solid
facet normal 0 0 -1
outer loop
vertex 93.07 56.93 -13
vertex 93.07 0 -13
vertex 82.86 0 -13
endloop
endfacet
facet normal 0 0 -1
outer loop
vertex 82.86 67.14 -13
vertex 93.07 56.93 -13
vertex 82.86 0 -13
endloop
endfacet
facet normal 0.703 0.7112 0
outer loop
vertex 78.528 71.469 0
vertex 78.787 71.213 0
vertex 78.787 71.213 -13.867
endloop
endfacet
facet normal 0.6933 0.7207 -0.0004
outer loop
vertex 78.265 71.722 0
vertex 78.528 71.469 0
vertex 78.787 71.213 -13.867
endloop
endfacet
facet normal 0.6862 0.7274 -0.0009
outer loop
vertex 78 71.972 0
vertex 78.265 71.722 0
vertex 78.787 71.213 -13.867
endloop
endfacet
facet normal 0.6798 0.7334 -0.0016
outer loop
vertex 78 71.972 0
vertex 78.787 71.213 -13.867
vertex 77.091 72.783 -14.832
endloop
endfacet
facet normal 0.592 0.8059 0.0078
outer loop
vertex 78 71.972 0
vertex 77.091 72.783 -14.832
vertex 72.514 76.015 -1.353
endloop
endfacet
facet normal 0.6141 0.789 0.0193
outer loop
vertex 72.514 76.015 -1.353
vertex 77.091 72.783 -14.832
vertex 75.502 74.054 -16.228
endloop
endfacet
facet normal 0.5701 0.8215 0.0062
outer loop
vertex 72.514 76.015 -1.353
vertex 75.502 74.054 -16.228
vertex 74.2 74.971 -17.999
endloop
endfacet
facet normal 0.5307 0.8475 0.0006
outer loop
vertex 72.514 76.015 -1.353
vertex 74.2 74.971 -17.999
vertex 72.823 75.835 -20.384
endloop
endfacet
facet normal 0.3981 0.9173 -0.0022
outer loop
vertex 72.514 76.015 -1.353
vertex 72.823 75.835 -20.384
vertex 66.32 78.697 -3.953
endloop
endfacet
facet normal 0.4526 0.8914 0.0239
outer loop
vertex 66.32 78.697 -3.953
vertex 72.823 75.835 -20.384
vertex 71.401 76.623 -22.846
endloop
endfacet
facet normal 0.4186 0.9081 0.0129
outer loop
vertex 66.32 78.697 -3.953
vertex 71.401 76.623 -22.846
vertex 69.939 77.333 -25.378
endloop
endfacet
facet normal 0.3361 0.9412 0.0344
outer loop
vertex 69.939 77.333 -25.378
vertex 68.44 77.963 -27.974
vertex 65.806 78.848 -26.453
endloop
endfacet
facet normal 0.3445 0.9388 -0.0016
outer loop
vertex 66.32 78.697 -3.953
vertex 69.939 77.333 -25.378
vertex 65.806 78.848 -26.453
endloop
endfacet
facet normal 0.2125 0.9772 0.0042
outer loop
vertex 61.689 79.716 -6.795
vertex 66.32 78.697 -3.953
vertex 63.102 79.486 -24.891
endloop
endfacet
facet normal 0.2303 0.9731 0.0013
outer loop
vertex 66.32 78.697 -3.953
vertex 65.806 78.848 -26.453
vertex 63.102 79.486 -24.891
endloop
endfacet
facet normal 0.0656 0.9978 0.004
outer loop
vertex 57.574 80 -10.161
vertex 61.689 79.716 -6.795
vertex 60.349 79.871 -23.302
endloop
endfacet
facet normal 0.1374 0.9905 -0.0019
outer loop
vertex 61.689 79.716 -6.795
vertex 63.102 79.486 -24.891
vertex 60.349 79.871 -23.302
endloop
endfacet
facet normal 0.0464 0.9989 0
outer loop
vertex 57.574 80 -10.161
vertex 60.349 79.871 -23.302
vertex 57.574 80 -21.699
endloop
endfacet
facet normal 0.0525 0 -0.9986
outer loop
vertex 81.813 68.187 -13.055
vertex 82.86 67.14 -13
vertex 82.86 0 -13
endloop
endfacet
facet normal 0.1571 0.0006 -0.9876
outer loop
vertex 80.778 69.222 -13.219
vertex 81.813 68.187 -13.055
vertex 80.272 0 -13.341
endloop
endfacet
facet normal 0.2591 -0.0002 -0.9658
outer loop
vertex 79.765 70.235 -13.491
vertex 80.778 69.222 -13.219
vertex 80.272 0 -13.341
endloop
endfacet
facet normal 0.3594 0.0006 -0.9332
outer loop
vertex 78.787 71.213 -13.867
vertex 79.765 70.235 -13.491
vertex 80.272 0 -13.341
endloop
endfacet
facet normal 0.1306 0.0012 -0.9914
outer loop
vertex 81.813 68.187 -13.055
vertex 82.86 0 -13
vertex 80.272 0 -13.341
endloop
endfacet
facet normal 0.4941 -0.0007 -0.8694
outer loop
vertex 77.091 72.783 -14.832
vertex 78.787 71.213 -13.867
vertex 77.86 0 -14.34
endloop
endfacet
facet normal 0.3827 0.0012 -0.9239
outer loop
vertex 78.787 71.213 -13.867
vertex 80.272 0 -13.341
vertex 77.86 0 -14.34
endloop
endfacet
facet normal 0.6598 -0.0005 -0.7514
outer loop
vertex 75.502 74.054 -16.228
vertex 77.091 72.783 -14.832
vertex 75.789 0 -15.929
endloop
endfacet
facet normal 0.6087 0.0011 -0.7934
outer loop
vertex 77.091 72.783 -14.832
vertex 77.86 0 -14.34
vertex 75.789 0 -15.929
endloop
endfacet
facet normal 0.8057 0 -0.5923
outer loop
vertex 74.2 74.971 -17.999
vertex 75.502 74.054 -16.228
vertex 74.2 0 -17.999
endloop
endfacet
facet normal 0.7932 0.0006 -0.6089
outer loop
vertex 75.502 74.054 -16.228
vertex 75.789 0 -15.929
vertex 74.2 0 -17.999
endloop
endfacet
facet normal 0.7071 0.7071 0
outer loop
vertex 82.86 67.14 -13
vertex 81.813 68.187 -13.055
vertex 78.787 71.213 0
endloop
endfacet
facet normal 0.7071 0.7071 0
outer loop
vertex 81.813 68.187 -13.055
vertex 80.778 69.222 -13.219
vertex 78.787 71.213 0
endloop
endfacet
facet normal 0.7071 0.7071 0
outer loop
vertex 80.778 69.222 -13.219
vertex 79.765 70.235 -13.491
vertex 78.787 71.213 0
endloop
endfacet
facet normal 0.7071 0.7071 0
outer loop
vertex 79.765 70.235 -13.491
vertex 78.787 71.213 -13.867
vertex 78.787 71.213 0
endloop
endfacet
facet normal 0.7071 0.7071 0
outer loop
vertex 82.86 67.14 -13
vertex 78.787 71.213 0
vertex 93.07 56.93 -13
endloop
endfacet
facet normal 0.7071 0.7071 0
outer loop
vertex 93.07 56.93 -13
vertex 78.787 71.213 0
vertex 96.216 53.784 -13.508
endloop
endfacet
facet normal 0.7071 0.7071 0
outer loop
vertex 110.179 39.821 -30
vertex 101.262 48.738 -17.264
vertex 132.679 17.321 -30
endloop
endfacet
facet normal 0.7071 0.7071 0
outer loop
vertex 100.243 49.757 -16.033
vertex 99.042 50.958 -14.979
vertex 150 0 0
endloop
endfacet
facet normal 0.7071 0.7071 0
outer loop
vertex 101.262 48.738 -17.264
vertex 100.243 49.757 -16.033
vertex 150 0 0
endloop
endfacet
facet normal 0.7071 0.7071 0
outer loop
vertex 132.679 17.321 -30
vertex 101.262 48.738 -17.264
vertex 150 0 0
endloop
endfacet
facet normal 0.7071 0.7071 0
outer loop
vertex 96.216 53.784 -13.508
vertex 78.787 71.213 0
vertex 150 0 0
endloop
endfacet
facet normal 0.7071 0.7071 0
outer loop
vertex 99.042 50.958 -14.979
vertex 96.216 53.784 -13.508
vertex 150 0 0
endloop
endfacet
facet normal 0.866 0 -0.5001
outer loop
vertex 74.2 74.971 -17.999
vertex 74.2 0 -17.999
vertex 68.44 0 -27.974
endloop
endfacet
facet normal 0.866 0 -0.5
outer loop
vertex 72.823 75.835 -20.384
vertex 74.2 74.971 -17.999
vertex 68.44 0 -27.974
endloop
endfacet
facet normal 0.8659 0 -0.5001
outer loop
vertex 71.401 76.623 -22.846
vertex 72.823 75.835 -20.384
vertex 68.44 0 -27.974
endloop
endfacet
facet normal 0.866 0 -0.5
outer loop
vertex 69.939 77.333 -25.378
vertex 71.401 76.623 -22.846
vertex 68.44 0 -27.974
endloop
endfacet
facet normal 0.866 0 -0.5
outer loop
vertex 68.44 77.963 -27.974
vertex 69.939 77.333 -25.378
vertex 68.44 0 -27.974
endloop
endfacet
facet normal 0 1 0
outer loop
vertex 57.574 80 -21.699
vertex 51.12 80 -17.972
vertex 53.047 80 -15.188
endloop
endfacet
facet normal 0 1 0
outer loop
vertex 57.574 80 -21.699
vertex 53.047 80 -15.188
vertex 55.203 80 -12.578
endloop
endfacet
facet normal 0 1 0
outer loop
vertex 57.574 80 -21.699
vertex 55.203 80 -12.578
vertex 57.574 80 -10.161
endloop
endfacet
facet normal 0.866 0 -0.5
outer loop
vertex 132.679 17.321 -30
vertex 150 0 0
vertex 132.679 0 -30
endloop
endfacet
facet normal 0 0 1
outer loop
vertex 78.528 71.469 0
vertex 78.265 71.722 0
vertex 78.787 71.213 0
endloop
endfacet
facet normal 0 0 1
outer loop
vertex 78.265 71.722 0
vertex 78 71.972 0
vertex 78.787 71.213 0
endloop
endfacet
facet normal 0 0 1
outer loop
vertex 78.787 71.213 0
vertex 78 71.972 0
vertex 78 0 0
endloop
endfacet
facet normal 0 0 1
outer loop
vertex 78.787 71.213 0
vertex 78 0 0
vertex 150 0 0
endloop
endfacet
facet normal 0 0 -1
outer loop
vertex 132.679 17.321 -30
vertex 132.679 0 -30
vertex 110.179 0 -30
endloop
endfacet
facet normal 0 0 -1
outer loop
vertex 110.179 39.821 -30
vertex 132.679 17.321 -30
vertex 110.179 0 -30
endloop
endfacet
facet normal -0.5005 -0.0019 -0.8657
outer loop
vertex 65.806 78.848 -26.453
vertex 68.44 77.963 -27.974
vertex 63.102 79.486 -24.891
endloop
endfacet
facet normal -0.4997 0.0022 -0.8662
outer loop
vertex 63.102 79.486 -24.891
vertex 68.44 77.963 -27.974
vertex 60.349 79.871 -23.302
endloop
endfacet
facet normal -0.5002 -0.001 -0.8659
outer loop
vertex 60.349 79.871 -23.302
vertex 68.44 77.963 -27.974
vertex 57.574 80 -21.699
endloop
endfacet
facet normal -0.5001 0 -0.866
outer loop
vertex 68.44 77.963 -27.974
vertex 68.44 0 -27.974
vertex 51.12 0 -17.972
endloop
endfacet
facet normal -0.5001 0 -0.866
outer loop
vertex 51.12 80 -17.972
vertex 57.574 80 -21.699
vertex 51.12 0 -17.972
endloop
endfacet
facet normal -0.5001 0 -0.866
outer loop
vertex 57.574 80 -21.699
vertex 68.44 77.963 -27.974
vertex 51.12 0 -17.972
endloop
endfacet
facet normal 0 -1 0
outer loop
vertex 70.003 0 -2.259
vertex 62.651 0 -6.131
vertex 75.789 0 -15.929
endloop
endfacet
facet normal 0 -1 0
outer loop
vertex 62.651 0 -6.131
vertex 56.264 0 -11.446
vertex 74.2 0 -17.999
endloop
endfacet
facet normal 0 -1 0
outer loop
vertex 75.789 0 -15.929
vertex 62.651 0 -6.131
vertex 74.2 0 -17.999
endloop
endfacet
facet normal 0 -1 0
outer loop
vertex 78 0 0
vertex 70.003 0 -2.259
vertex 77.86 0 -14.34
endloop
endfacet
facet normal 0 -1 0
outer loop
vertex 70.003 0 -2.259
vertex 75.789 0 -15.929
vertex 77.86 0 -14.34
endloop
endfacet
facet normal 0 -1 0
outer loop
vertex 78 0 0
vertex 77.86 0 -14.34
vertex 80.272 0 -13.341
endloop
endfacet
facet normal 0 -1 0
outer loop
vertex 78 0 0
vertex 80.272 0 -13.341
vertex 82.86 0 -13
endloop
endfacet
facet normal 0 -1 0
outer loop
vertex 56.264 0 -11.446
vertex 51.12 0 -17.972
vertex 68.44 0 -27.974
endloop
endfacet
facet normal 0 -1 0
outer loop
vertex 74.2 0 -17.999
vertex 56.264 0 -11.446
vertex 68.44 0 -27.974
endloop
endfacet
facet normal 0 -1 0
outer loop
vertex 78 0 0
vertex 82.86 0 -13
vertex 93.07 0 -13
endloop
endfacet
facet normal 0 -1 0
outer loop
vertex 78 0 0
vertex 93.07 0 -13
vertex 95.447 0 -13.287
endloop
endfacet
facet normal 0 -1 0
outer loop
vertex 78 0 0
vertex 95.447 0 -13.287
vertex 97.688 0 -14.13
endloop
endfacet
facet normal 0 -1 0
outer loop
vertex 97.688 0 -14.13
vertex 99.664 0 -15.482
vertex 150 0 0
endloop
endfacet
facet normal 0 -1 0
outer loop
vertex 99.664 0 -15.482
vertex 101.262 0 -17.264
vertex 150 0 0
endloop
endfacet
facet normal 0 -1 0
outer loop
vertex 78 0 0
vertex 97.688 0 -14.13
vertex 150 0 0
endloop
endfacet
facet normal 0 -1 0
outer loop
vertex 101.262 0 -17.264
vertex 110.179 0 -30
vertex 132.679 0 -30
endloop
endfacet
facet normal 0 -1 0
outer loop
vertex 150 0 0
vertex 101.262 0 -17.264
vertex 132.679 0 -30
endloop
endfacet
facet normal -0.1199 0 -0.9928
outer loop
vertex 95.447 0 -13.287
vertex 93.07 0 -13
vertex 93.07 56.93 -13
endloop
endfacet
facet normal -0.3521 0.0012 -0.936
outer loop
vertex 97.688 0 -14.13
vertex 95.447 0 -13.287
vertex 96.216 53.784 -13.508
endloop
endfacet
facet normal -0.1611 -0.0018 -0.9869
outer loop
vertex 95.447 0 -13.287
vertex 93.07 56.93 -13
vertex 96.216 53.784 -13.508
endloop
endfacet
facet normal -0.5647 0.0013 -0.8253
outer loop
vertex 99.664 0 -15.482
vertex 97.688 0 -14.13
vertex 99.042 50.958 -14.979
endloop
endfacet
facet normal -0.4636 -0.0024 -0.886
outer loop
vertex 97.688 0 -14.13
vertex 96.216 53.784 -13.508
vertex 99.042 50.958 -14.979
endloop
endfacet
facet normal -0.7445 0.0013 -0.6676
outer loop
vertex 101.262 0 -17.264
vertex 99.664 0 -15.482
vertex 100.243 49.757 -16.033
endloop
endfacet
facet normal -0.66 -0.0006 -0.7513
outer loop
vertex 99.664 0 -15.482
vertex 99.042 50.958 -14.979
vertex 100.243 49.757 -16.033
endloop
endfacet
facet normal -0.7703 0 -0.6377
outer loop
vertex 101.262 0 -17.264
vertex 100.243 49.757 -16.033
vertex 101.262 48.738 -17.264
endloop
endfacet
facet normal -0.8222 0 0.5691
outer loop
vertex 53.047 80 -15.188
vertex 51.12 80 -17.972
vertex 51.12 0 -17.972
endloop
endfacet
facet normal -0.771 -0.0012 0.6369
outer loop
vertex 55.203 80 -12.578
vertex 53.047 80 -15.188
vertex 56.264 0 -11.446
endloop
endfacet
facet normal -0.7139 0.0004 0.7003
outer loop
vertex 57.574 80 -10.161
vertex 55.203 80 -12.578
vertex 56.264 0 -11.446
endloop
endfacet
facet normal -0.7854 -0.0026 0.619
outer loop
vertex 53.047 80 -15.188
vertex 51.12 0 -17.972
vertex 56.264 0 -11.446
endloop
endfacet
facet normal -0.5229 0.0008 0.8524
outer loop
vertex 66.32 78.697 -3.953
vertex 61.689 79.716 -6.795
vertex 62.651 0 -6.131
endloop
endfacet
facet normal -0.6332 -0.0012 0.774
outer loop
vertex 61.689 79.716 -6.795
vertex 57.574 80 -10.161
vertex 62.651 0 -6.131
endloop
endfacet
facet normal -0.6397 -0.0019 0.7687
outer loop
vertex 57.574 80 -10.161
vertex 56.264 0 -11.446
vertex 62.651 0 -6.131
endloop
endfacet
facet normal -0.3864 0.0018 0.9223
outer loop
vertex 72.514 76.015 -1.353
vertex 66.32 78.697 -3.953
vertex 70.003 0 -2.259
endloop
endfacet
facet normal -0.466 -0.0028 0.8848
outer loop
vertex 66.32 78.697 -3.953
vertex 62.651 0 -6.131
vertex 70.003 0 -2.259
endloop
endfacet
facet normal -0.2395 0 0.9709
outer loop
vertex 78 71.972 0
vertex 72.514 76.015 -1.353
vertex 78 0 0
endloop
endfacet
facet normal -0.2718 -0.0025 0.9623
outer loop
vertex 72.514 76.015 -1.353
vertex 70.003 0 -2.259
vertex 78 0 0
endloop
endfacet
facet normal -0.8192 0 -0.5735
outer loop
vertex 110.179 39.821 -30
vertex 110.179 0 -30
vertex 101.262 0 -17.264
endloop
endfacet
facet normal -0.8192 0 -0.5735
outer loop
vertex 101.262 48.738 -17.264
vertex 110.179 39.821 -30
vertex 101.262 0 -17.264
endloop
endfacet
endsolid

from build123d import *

# Parameters (mm, degrees)
BOSS_EXTRUDE1_DEPTH = 80
CUT_EXTRUDE1_DEPTH  = 60
FILLET1_R           = 30
FILLET3_R           = 10


with BuildPart() as part:
    # Sketch31 → Boss-Extrude1 (new body)
    with BuildSketch(Plane(origin=(0, 0, 0), x_dir=(1, 0, 0), z_dir=(0, 1, 0))):
        with BuildLine():
            Line((78, 0), (150, 0))
            Line((150, 0), (132.679491924, 30))
            Line((132.679491924, 30), (110.179491924, 30))
            Line((110.179491924, 30), (98.275963775, 13))
            Line((98.275963775, 13), (82.859757015, 13))
            ThreePointArc((82.859757015, 13), (77.860100275, 14.33954779), (74.199899362, 17.999313504))
            Line((74.199899362, 17.999313504), (68.440162758, 27.973643859))
            Line((68.440162758, 27.973643859), (51.120447452, 17.972270867))
            ThreePointArc((51.120447452, 17.972270867), (62.6510159, 6.130700387), (78, 0))
        make_face()
    extrude(amount=BOSS_EXTRUDE1_DEPTH)

    # Sketch32 → Cut-Extrude1 (cut)
    with BuildSketch(Plane.XY):
        Polygon((70, 80), (150, 0), (150, 80), align=None)
    extrude(amount=-CUT_EXTRUDE1_DEPTH, mode=Mode.SUBTRACT)

    # Fillet1
    fillet1_edges = [part.edges().sort_by_distance(p)[0] for p in [
        (70, 80, -13.766443848),
    ]]
    fillet(fillet1_edges, radius=FILLET1_R)

    # Fillet3
    fillet3_edges = [part.edges().sort_by_distance(p)[0] for p in [
        (98.275963775, 25.862018113, -13),
    ]]
    fillet(fillet3_edges, radius=FILLET3_R)


solid = part.part
